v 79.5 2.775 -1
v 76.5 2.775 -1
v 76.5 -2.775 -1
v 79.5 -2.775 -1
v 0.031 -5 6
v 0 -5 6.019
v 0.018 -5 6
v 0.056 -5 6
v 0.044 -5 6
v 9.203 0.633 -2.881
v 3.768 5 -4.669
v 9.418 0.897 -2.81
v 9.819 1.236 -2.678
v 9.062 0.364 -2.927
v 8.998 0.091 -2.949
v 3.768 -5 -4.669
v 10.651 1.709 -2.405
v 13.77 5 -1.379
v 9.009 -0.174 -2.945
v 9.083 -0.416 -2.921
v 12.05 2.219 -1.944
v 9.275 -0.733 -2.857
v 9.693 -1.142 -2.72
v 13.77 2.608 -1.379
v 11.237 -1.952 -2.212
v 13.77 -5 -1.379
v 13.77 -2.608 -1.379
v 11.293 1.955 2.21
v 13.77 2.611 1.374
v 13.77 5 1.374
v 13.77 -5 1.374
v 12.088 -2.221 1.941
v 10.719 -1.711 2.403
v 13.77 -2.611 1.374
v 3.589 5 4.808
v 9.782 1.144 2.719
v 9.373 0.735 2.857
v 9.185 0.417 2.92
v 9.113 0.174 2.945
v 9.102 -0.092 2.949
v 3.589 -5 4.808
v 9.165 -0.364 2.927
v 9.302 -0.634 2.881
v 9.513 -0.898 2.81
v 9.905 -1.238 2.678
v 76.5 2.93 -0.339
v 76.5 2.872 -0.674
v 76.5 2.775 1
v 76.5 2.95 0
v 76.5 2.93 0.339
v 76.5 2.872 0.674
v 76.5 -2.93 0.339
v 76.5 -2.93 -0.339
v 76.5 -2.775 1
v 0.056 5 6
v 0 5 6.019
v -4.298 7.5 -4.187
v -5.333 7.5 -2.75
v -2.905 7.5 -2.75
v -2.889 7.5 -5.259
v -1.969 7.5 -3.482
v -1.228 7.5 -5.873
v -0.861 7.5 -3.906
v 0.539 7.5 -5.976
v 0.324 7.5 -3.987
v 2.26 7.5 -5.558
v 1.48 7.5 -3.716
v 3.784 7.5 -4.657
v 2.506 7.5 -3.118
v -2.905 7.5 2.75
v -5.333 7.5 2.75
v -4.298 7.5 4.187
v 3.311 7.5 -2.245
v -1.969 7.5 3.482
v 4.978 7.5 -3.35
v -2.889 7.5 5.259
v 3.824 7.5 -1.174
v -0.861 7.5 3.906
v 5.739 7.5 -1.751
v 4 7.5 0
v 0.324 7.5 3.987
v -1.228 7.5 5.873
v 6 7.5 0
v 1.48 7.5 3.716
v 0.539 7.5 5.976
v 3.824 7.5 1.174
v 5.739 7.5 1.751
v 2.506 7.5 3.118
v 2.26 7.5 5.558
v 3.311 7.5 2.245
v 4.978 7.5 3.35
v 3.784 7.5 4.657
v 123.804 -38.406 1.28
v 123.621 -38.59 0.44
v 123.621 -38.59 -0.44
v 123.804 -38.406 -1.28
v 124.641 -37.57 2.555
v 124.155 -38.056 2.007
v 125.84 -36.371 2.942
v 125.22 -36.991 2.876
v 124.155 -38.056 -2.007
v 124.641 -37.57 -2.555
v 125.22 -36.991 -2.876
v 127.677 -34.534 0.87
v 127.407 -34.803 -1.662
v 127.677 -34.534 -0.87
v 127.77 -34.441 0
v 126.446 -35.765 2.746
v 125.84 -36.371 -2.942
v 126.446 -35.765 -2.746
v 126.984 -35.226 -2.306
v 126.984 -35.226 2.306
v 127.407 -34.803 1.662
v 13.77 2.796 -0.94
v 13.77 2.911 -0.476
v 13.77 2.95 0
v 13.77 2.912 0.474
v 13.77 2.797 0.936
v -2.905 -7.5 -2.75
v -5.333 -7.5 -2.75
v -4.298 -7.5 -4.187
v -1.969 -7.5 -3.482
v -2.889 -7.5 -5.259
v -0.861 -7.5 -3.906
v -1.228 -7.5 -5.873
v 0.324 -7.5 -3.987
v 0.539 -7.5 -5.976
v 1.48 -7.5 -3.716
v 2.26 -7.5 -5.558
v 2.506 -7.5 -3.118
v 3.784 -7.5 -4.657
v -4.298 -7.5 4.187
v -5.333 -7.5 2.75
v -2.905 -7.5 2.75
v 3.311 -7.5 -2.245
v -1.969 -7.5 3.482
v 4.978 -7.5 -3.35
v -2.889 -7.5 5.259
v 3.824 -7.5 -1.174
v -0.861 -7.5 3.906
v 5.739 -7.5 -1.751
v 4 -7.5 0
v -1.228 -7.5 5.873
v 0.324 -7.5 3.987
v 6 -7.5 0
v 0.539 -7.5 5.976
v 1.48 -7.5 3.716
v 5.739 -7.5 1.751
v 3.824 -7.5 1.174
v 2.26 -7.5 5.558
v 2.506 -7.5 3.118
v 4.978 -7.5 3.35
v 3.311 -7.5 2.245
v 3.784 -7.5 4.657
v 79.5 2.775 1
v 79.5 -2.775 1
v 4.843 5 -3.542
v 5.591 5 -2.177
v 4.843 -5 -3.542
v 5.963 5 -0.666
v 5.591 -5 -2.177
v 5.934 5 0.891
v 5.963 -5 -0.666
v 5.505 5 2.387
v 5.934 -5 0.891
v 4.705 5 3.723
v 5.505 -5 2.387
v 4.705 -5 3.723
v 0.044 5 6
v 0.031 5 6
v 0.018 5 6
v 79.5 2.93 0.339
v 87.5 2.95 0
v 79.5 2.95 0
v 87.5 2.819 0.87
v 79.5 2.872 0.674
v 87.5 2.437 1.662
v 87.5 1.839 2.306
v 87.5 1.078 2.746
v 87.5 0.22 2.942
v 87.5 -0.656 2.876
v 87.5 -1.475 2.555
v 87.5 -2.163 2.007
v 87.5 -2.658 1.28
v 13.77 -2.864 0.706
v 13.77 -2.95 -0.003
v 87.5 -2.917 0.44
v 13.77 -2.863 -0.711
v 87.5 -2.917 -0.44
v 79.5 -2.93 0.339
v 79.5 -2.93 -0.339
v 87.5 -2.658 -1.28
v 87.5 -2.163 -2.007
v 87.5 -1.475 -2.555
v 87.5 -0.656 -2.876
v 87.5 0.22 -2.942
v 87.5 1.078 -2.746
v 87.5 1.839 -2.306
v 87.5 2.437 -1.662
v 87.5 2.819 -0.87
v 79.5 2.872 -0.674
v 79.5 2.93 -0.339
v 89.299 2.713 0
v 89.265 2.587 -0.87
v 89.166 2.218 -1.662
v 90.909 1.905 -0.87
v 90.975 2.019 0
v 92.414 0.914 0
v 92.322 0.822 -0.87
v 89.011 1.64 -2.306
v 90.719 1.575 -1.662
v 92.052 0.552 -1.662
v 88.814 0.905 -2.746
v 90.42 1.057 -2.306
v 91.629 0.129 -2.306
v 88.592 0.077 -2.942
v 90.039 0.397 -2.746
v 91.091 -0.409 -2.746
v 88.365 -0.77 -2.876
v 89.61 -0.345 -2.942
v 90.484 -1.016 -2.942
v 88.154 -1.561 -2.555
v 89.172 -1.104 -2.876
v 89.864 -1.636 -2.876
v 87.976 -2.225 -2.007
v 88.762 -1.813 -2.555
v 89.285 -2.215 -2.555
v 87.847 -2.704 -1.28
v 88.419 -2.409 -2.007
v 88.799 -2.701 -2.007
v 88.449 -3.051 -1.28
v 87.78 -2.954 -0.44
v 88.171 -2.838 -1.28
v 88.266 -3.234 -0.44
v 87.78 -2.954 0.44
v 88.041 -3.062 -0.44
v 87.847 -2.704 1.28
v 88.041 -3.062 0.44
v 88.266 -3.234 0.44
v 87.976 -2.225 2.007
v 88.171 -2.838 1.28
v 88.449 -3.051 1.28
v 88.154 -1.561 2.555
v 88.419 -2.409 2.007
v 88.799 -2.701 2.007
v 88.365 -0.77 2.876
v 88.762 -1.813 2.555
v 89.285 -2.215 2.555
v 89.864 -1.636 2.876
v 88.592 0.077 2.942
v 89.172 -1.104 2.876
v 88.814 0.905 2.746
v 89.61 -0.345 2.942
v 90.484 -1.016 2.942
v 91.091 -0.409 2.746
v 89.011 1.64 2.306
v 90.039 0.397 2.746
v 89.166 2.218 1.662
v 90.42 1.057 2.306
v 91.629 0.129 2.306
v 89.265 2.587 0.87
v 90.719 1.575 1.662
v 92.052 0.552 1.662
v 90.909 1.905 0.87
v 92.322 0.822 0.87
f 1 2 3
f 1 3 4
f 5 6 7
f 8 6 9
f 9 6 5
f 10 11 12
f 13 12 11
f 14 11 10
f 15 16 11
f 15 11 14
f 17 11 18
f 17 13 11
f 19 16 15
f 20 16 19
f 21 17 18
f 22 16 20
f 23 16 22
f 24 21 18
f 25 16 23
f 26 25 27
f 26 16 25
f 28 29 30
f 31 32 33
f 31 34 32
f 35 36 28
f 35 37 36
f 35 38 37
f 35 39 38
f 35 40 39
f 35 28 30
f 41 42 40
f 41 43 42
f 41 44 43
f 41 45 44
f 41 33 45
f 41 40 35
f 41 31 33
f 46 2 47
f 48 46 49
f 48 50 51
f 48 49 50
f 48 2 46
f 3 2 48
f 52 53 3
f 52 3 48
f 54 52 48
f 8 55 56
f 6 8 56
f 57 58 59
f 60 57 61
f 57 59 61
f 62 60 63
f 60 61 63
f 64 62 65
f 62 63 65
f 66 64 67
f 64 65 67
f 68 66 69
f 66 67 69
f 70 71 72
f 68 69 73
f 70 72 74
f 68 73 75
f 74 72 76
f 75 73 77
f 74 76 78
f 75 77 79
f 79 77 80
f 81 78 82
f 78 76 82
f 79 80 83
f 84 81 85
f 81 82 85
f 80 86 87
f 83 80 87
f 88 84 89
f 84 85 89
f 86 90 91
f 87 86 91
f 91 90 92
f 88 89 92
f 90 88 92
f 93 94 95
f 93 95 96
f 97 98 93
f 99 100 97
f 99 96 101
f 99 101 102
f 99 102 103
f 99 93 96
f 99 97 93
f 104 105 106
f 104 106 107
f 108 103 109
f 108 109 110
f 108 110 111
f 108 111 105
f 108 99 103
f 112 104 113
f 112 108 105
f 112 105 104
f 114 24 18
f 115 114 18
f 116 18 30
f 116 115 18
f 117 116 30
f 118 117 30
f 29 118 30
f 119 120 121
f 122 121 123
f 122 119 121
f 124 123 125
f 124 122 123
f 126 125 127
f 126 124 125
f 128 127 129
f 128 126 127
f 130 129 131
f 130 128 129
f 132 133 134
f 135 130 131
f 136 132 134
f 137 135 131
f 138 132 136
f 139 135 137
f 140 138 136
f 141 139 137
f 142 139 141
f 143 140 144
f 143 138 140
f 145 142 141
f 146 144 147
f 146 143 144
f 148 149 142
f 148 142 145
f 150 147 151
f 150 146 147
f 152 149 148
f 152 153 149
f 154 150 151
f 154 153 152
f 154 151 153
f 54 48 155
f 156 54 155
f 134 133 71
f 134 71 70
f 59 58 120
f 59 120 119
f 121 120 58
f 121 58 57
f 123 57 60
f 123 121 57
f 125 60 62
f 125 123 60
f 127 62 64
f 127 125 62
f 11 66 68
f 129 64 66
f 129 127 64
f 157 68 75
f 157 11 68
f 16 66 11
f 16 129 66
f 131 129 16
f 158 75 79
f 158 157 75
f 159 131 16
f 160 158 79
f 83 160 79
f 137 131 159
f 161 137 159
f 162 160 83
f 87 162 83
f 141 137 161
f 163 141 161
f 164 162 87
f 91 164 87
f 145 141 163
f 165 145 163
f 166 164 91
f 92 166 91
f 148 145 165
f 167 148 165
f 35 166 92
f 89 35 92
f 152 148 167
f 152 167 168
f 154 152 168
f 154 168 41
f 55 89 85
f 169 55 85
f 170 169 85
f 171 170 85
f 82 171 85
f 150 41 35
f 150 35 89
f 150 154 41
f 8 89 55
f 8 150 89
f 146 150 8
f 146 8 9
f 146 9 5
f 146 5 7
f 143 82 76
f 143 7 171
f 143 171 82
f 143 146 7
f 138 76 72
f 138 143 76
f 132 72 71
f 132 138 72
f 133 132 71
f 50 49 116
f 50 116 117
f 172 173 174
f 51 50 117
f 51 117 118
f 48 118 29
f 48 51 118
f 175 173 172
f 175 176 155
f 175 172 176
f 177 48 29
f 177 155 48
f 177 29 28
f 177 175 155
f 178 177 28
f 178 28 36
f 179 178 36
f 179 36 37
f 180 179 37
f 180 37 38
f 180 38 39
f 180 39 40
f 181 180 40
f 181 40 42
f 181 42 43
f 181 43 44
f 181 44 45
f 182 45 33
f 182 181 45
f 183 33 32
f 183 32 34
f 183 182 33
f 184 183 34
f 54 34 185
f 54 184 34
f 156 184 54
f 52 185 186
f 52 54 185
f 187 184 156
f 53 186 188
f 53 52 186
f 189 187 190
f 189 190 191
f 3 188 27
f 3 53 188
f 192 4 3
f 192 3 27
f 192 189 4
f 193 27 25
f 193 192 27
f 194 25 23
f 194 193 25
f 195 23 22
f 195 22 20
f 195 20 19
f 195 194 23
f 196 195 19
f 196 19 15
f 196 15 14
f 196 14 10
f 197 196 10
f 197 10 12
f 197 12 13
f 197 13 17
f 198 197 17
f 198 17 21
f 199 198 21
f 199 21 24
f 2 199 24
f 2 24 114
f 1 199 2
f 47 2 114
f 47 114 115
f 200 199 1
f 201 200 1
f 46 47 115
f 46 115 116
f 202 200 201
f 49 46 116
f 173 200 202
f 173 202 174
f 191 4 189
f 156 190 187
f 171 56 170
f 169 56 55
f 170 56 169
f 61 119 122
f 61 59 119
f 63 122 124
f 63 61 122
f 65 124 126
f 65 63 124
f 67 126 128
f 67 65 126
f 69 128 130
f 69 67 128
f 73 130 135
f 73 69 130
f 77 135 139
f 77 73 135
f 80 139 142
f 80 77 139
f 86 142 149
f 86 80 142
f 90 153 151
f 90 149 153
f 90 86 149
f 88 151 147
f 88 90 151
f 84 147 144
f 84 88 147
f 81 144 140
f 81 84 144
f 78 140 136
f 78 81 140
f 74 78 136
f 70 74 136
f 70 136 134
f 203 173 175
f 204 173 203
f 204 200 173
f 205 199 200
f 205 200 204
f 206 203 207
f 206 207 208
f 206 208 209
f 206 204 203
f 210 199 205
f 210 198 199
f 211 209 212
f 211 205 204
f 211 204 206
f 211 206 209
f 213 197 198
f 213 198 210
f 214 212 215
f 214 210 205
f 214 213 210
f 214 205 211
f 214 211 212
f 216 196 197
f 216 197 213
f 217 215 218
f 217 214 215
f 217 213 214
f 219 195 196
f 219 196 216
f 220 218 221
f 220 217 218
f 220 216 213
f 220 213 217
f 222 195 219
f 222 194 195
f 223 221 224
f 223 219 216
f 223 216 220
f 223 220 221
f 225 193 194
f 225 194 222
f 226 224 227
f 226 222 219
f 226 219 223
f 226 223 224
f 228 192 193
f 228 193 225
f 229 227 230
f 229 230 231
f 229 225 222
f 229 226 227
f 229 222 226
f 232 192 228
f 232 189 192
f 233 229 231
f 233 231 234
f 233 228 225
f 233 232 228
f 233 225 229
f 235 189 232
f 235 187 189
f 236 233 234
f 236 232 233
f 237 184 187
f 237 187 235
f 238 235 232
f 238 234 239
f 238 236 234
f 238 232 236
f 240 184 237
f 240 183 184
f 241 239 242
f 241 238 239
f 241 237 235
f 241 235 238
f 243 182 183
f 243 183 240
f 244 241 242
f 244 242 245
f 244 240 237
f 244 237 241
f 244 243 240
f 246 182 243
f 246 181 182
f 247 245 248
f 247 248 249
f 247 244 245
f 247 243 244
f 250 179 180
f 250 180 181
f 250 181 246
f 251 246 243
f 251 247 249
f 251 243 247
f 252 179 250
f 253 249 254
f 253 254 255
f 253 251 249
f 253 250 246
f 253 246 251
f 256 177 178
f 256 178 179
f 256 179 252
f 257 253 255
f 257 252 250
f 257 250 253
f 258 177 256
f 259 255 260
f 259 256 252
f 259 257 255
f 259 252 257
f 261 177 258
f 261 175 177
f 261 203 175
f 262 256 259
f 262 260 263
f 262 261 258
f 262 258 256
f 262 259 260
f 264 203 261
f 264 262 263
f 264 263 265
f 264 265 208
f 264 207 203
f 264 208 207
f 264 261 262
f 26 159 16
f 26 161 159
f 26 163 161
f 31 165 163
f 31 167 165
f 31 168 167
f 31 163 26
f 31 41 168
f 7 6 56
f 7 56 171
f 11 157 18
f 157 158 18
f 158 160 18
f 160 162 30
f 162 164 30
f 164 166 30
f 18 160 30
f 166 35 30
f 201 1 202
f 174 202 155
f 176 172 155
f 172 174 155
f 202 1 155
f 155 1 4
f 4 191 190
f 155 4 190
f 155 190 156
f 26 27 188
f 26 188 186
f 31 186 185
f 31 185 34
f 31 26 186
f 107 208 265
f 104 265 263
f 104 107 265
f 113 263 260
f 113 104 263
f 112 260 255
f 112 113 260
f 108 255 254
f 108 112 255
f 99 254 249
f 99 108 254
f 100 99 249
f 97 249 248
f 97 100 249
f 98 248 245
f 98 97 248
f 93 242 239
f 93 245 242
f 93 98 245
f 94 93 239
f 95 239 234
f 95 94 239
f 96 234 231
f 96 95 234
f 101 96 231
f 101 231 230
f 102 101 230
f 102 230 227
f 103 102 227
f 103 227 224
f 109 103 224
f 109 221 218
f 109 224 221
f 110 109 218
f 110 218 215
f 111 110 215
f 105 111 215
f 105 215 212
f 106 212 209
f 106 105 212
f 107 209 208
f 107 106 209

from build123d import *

# Parameters (mm, degrees)
F0_R      = 6
F0_R_2    = 4
F1_DEPTH  = 7.5
F3_R      = 2.95
F4_DEPTH  = 80
F5_W      = 20
F5_H      = 5.5
F6_DEPTH  = 25
F12_DEPTH = 5
F13_W     = 3
F13_H     = 2
F14_DEPTH = 12.5
F16_R     = 2.95


with BuildPart() as f1:
    # F0 (on Front) → F1 (new body, symmetric)
    with BuildSketch(Plane.XZ):
        Circle(F0_R)
        Circle(F0_R_2, mode=Mode.SUBTRACT)
    extrude(amount=F1_DEPTH, both=True)

    # F3 (on offset) → F4 (join)
    with BuildSketch(Plane.YZ.offset(4.5)):
        Circle(F3_R)
    extrude(amount=F4_DEPTH)

    # F5 (on face) → F6 (cut)
    with BuildSketch(Plane.XZ.offset(7.5)):
        with Locations((-10, 0)):
            Rectangle(F5_W, F5_H)
    extrude(amount=-F6_DEPTH, mode=Mode.SUBTRACT)

    # F11 (on face) → F12 (join, symmetric)
    with BuildSketch(Plane.XZ):
        Polygon((13.7702096254, 1.3738754205), (0, 6.0186968185), (5.8568101376, 0), (0, -5.9087458067), (13.7702096254, -1.3786113122), align=None)
    extrude(amount=F12_DEPTH, both=True)

    # F13 (on Front) → F14 (cut, symmetric)
    with BuildSketch(Plane.XZ):
        with Locations((78, 0)):
            Rectangle(F13_W, F13_H)
    extrude(amount=F14_DEPTH, both=True, mode=Mode.SUBTRACT)

    # F17: sweep along a path in F15
    with BuildLine(Plane.XY) as f17_path:
        Line((84.5, 0), (87.5, 0))
        ThreePointArc((87.5, 0), (89.0307337295, -0.30448187), (90.3284271247, -1.1715728753))
        Line((90.3284271247, -1.1715728753), (125.6837661841, -36.5269119346))
    # F16 (on face) → F17 (sweep)
    with BuildSketch(Plane.YZ.offset(84.5)):
        Circle(F16_R)
    sweep(path=f17_path.line)


solid = f1.part
